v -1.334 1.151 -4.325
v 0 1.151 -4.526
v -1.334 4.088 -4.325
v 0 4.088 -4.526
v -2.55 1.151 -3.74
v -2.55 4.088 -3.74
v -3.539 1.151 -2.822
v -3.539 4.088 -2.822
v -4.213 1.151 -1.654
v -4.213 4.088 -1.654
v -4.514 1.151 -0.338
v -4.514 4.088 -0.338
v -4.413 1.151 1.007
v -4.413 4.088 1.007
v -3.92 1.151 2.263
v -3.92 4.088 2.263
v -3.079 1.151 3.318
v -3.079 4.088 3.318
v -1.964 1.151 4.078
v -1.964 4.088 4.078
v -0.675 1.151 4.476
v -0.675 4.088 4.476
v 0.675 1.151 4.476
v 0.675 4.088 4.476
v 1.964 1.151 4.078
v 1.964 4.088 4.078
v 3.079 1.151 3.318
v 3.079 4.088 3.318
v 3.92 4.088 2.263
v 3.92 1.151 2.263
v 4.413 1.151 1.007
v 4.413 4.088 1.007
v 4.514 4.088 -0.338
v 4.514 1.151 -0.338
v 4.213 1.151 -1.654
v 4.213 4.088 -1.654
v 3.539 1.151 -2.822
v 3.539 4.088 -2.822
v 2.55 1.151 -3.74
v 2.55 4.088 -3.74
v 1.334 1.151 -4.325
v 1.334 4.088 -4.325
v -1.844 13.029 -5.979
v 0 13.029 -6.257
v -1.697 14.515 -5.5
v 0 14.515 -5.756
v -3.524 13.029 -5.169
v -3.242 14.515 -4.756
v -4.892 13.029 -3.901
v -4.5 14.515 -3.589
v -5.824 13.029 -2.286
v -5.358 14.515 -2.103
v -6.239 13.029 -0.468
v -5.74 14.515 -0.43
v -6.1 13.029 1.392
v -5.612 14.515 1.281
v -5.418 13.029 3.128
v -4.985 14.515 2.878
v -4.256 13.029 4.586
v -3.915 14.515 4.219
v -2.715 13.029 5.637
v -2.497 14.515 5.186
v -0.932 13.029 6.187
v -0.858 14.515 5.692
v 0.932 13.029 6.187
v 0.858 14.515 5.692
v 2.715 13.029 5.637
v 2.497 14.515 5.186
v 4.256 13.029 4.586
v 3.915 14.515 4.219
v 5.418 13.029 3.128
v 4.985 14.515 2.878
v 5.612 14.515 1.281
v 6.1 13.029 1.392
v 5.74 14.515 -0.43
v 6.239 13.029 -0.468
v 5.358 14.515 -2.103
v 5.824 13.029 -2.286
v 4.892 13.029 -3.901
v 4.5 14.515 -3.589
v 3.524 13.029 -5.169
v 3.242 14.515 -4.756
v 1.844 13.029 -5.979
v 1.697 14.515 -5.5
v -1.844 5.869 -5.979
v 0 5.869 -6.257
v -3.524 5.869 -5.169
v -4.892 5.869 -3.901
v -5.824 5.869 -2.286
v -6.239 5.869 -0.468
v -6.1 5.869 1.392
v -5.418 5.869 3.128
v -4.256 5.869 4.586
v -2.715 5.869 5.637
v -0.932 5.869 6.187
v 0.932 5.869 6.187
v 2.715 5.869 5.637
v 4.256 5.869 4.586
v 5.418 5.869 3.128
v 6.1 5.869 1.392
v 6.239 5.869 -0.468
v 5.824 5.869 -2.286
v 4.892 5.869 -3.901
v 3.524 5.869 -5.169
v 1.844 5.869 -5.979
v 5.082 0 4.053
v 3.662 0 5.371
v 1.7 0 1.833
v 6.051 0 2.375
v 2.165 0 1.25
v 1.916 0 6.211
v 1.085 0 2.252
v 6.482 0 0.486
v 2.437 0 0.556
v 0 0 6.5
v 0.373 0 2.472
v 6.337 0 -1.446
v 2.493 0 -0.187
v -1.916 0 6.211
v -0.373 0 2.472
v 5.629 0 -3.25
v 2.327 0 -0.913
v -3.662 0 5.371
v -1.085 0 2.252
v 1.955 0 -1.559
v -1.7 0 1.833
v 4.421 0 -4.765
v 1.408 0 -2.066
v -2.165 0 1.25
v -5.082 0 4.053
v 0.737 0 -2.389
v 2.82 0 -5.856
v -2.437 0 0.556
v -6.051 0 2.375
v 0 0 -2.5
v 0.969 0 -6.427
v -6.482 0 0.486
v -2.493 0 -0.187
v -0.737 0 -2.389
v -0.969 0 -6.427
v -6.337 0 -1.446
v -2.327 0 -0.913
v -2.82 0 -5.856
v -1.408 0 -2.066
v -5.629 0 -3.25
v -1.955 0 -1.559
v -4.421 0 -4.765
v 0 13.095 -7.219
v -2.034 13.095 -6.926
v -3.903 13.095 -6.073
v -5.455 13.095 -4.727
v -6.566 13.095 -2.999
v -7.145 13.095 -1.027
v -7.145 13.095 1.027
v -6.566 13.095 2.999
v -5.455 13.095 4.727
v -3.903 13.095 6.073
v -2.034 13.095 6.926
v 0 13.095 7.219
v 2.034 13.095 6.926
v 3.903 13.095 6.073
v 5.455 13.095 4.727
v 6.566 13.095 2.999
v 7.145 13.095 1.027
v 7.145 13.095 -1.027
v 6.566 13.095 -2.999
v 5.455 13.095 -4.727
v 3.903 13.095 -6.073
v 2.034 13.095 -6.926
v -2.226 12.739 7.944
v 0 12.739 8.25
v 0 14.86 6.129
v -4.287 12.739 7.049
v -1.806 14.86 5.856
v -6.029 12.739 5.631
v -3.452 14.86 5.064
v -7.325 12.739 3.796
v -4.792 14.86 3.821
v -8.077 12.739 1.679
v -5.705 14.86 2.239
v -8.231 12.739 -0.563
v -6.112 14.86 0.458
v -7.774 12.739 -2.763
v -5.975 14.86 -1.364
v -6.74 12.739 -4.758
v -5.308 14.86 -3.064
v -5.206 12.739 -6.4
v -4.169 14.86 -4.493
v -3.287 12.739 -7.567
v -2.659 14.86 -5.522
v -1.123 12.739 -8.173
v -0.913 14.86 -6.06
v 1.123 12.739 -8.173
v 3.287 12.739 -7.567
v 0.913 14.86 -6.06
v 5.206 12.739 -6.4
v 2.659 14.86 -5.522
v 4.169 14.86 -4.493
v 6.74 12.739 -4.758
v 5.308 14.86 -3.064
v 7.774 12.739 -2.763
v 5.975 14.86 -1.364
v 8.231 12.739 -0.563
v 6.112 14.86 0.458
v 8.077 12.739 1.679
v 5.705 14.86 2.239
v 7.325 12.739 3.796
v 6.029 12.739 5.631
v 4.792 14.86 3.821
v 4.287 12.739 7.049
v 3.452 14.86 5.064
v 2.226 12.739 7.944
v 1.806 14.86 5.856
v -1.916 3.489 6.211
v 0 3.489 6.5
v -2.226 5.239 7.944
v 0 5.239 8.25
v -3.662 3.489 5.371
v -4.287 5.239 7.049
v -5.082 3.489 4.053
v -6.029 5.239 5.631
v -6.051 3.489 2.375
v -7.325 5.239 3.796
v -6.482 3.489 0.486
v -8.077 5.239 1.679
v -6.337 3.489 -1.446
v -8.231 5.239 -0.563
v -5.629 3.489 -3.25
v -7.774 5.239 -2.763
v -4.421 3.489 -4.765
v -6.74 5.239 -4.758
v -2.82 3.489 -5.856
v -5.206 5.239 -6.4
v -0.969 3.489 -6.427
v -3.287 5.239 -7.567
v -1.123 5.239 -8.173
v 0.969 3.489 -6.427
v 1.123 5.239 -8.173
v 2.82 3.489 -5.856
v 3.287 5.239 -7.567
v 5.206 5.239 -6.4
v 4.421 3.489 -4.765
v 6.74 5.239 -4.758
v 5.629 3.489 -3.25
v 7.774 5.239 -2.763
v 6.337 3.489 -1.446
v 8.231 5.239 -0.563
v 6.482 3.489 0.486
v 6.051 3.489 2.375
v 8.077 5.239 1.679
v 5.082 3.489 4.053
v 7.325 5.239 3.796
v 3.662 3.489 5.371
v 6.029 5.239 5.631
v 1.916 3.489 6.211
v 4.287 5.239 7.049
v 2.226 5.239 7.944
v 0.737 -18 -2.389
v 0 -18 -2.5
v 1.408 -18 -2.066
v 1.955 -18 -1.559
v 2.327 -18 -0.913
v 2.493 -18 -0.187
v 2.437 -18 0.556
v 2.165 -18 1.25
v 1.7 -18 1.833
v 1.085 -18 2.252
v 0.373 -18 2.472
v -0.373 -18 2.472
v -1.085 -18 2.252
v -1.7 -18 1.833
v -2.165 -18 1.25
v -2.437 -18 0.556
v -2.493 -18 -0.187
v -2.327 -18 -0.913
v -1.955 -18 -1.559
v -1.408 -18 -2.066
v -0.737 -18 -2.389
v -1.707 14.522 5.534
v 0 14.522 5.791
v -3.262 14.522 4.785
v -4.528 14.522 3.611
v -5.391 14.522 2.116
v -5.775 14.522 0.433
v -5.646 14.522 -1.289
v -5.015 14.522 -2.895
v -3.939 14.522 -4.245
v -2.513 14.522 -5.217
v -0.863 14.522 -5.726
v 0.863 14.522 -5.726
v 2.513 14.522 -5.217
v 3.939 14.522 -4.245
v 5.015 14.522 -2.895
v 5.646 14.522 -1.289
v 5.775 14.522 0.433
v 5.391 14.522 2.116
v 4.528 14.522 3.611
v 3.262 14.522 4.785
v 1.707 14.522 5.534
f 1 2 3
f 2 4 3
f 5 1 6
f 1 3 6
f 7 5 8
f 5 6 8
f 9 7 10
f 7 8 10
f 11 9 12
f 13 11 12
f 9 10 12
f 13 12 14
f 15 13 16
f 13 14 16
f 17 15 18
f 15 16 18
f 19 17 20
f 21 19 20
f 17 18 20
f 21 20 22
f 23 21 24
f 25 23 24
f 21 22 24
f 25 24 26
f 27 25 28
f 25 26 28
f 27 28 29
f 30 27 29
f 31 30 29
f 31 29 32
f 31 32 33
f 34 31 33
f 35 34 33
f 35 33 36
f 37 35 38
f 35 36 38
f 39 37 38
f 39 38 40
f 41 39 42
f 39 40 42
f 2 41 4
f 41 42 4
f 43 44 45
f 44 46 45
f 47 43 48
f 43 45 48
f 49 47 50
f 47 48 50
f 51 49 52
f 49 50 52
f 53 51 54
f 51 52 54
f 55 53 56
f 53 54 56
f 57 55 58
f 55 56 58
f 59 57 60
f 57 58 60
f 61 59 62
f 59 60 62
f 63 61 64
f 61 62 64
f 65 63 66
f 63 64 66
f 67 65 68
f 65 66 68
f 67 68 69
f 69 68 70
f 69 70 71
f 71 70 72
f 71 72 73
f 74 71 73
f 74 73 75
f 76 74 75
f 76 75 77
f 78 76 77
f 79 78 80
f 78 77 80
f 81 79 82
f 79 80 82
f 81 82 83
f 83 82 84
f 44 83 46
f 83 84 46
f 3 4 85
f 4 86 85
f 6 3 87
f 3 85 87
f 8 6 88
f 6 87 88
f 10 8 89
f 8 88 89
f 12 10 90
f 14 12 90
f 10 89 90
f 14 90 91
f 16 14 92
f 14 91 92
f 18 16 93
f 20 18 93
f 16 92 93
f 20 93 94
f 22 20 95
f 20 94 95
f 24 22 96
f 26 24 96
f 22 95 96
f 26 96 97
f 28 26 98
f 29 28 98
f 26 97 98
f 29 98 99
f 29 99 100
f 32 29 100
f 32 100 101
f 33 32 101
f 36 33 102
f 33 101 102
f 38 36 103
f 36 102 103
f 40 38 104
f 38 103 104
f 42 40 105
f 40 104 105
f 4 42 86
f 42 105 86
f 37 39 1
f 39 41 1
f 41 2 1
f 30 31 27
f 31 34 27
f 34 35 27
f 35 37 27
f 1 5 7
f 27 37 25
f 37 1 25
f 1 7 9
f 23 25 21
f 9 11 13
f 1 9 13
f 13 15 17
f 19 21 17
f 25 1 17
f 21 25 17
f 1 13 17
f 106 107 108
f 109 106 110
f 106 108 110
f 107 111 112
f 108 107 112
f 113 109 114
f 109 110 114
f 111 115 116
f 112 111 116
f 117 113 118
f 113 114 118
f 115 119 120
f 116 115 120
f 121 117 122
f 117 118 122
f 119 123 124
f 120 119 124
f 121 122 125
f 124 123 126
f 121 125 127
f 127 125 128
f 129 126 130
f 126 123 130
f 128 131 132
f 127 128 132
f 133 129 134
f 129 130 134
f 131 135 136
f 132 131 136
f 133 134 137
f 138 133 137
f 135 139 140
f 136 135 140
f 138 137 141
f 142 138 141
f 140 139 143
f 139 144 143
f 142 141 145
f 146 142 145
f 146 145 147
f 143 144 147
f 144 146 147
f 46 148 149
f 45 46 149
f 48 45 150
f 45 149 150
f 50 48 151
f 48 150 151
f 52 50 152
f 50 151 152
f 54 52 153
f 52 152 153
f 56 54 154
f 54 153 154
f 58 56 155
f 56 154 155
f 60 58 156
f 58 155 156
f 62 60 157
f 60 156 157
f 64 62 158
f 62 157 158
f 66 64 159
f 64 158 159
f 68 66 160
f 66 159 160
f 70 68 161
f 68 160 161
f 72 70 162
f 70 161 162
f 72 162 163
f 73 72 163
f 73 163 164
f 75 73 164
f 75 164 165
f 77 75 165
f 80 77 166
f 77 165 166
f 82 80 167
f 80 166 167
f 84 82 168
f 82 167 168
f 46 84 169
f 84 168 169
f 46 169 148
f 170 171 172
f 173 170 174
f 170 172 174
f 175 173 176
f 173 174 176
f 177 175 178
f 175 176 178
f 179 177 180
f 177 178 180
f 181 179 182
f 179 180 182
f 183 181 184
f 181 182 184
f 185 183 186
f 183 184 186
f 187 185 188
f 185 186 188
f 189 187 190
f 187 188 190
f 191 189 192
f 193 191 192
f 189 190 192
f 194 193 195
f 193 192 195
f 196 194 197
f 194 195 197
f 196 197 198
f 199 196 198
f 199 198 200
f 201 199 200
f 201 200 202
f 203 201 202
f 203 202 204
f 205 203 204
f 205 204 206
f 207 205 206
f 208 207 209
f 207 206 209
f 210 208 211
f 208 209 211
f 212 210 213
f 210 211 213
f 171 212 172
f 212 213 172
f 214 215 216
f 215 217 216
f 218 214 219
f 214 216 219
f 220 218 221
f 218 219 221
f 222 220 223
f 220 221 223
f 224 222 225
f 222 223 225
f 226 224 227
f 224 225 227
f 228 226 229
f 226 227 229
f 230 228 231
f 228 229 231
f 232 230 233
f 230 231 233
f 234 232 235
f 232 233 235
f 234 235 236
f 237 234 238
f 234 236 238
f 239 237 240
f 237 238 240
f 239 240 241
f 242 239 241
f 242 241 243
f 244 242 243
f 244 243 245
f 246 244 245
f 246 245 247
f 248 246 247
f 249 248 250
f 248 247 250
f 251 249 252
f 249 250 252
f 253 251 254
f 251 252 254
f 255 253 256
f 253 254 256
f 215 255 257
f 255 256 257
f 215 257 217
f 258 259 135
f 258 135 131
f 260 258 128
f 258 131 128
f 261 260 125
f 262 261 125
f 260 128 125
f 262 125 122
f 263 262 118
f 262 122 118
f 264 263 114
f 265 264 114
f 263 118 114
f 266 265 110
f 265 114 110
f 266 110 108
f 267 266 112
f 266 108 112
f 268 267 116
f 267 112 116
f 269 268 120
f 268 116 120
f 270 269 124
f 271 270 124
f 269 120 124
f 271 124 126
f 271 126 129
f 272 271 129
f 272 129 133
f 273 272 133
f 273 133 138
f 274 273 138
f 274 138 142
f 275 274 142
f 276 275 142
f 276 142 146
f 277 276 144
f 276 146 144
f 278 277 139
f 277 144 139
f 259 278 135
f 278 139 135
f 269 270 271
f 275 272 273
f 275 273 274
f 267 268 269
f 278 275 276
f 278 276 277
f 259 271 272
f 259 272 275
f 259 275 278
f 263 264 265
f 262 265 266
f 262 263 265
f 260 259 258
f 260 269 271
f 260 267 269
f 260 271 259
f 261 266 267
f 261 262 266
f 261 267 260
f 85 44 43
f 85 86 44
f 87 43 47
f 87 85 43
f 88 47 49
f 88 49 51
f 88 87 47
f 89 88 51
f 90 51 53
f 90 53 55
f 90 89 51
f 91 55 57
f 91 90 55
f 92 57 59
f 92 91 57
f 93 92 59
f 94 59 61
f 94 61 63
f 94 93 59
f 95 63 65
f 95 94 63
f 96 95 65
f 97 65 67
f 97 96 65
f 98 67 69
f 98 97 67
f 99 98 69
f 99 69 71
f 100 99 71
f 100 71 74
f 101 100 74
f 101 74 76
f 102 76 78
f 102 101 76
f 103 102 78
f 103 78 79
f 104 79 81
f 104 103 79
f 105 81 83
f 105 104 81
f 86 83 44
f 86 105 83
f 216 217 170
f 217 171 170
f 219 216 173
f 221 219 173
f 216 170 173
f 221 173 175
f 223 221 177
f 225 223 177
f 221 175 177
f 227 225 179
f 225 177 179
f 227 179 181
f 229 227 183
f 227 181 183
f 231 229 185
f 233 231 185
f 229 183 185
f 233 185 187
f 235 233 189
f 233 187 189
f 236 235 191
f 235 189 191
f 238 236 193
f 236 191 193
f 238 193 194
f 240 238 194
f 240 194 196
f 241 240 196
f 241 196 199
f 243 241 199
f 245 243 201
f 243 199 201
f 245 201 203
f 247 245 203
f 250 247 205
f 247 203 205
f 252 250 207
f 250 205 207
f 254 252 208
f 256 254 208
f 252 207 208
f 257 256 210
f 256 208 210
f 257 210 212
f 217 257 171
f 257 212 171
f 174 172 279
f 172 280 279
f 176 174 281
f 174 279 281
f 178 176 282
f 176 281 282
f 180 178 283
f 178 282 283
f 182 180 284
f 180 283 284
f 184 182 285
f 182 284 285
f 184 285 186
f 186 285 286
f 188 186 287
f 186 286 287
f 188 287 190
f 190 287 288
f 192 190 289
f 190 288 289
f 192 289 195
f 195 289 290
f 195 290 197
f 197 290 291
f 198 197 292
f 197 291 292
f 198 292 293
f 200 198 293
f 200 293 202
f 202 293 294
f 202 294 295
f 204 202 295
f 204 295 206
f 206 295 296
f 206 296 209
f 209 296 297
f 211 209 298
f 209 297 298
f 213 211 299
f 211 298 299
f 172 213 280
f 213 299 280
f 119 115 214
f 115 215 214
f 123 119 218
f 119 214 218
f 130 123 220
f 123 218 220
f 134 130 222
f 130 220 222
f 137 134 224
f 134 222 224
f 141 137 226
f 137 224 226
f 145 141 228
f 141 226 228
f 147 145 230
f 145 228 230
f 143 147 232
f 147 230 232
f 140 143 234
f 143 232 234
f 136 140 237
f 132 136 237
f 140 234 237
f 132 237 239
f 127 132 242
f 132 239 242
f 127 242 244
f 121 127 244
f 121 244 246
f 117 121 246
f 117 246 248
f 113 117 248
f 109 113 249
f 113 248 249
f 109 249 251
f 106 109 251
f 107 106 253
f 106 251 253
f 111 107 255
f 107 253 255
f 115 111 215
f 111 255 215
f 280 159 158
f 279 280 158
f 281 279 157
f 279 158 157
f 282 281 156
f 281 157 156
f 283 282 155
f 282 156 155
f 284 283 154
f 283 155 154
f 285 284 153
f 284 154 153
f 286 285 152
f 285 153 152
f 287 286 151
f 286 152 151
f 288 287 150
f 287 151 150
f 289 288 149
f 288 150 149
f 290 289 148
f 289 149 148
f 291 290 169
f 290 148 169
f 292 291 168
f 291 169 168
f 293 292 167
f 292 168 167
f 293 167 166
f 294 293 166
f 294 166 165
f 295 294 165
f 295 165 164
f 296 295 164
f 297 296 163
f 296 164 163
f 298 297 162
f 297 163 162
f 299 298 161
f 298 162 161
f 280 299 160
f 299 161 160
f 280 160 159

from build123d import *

# Parameters (mm, degrees)
SKETCH2_R           = 2.5
BOSS_EXTRUDE1_DEPTH = 18


with BuildPart() as part:
    # Sketch1 → Revolve1 (revolve)
    with BuildSketch(Plane.XY):
        Polygon((0, 0), (-6.5, 0), (-6.5, 3.48875), (-8.25, 5.23875), (-8.25, 12.73875), (-6.128679656, 14.860070344), (-5.790903941, 14.522294629), (-7.75, 12.56319857), (-7.75, 5.56319857), (-6, 3.81319857), (-6, 0.5), (0, 0.5), align=None)
    revolve(axis=Axis((0, 0.5, 0), (0, -1, 0)))

    # Sketch2 → Boss-Extrude1 (add)
    with BuildSketch(Plane.XZ):
        Circle(SKETCH2_R)
    extrude(amount=BOSS_EXTRUDE1_DEPTH)

    # Sketch3 → Revolve2 (revolve)
    with BuildSketch(Plane.XY):
        Polygon((7.756571399, 12.572177682), (7.756571399, 5.526763194), (6.042904197, 3.762081274), (6.042904197, 0.47971139), (0, 0.47971139), (0, 1.150787733), (4.526358004, 1.150787733), (4.526358004, 4.087737861), (6.256571399, 5.869458543), (6.256571399, 12.21791401), (6.256571399, 13.029033499), (5.755922464, 14.51499039), align=None)
    revolve(axis=Axis((0, 0.47971139, 0), (0, 1, 0)))


solid = part.part
